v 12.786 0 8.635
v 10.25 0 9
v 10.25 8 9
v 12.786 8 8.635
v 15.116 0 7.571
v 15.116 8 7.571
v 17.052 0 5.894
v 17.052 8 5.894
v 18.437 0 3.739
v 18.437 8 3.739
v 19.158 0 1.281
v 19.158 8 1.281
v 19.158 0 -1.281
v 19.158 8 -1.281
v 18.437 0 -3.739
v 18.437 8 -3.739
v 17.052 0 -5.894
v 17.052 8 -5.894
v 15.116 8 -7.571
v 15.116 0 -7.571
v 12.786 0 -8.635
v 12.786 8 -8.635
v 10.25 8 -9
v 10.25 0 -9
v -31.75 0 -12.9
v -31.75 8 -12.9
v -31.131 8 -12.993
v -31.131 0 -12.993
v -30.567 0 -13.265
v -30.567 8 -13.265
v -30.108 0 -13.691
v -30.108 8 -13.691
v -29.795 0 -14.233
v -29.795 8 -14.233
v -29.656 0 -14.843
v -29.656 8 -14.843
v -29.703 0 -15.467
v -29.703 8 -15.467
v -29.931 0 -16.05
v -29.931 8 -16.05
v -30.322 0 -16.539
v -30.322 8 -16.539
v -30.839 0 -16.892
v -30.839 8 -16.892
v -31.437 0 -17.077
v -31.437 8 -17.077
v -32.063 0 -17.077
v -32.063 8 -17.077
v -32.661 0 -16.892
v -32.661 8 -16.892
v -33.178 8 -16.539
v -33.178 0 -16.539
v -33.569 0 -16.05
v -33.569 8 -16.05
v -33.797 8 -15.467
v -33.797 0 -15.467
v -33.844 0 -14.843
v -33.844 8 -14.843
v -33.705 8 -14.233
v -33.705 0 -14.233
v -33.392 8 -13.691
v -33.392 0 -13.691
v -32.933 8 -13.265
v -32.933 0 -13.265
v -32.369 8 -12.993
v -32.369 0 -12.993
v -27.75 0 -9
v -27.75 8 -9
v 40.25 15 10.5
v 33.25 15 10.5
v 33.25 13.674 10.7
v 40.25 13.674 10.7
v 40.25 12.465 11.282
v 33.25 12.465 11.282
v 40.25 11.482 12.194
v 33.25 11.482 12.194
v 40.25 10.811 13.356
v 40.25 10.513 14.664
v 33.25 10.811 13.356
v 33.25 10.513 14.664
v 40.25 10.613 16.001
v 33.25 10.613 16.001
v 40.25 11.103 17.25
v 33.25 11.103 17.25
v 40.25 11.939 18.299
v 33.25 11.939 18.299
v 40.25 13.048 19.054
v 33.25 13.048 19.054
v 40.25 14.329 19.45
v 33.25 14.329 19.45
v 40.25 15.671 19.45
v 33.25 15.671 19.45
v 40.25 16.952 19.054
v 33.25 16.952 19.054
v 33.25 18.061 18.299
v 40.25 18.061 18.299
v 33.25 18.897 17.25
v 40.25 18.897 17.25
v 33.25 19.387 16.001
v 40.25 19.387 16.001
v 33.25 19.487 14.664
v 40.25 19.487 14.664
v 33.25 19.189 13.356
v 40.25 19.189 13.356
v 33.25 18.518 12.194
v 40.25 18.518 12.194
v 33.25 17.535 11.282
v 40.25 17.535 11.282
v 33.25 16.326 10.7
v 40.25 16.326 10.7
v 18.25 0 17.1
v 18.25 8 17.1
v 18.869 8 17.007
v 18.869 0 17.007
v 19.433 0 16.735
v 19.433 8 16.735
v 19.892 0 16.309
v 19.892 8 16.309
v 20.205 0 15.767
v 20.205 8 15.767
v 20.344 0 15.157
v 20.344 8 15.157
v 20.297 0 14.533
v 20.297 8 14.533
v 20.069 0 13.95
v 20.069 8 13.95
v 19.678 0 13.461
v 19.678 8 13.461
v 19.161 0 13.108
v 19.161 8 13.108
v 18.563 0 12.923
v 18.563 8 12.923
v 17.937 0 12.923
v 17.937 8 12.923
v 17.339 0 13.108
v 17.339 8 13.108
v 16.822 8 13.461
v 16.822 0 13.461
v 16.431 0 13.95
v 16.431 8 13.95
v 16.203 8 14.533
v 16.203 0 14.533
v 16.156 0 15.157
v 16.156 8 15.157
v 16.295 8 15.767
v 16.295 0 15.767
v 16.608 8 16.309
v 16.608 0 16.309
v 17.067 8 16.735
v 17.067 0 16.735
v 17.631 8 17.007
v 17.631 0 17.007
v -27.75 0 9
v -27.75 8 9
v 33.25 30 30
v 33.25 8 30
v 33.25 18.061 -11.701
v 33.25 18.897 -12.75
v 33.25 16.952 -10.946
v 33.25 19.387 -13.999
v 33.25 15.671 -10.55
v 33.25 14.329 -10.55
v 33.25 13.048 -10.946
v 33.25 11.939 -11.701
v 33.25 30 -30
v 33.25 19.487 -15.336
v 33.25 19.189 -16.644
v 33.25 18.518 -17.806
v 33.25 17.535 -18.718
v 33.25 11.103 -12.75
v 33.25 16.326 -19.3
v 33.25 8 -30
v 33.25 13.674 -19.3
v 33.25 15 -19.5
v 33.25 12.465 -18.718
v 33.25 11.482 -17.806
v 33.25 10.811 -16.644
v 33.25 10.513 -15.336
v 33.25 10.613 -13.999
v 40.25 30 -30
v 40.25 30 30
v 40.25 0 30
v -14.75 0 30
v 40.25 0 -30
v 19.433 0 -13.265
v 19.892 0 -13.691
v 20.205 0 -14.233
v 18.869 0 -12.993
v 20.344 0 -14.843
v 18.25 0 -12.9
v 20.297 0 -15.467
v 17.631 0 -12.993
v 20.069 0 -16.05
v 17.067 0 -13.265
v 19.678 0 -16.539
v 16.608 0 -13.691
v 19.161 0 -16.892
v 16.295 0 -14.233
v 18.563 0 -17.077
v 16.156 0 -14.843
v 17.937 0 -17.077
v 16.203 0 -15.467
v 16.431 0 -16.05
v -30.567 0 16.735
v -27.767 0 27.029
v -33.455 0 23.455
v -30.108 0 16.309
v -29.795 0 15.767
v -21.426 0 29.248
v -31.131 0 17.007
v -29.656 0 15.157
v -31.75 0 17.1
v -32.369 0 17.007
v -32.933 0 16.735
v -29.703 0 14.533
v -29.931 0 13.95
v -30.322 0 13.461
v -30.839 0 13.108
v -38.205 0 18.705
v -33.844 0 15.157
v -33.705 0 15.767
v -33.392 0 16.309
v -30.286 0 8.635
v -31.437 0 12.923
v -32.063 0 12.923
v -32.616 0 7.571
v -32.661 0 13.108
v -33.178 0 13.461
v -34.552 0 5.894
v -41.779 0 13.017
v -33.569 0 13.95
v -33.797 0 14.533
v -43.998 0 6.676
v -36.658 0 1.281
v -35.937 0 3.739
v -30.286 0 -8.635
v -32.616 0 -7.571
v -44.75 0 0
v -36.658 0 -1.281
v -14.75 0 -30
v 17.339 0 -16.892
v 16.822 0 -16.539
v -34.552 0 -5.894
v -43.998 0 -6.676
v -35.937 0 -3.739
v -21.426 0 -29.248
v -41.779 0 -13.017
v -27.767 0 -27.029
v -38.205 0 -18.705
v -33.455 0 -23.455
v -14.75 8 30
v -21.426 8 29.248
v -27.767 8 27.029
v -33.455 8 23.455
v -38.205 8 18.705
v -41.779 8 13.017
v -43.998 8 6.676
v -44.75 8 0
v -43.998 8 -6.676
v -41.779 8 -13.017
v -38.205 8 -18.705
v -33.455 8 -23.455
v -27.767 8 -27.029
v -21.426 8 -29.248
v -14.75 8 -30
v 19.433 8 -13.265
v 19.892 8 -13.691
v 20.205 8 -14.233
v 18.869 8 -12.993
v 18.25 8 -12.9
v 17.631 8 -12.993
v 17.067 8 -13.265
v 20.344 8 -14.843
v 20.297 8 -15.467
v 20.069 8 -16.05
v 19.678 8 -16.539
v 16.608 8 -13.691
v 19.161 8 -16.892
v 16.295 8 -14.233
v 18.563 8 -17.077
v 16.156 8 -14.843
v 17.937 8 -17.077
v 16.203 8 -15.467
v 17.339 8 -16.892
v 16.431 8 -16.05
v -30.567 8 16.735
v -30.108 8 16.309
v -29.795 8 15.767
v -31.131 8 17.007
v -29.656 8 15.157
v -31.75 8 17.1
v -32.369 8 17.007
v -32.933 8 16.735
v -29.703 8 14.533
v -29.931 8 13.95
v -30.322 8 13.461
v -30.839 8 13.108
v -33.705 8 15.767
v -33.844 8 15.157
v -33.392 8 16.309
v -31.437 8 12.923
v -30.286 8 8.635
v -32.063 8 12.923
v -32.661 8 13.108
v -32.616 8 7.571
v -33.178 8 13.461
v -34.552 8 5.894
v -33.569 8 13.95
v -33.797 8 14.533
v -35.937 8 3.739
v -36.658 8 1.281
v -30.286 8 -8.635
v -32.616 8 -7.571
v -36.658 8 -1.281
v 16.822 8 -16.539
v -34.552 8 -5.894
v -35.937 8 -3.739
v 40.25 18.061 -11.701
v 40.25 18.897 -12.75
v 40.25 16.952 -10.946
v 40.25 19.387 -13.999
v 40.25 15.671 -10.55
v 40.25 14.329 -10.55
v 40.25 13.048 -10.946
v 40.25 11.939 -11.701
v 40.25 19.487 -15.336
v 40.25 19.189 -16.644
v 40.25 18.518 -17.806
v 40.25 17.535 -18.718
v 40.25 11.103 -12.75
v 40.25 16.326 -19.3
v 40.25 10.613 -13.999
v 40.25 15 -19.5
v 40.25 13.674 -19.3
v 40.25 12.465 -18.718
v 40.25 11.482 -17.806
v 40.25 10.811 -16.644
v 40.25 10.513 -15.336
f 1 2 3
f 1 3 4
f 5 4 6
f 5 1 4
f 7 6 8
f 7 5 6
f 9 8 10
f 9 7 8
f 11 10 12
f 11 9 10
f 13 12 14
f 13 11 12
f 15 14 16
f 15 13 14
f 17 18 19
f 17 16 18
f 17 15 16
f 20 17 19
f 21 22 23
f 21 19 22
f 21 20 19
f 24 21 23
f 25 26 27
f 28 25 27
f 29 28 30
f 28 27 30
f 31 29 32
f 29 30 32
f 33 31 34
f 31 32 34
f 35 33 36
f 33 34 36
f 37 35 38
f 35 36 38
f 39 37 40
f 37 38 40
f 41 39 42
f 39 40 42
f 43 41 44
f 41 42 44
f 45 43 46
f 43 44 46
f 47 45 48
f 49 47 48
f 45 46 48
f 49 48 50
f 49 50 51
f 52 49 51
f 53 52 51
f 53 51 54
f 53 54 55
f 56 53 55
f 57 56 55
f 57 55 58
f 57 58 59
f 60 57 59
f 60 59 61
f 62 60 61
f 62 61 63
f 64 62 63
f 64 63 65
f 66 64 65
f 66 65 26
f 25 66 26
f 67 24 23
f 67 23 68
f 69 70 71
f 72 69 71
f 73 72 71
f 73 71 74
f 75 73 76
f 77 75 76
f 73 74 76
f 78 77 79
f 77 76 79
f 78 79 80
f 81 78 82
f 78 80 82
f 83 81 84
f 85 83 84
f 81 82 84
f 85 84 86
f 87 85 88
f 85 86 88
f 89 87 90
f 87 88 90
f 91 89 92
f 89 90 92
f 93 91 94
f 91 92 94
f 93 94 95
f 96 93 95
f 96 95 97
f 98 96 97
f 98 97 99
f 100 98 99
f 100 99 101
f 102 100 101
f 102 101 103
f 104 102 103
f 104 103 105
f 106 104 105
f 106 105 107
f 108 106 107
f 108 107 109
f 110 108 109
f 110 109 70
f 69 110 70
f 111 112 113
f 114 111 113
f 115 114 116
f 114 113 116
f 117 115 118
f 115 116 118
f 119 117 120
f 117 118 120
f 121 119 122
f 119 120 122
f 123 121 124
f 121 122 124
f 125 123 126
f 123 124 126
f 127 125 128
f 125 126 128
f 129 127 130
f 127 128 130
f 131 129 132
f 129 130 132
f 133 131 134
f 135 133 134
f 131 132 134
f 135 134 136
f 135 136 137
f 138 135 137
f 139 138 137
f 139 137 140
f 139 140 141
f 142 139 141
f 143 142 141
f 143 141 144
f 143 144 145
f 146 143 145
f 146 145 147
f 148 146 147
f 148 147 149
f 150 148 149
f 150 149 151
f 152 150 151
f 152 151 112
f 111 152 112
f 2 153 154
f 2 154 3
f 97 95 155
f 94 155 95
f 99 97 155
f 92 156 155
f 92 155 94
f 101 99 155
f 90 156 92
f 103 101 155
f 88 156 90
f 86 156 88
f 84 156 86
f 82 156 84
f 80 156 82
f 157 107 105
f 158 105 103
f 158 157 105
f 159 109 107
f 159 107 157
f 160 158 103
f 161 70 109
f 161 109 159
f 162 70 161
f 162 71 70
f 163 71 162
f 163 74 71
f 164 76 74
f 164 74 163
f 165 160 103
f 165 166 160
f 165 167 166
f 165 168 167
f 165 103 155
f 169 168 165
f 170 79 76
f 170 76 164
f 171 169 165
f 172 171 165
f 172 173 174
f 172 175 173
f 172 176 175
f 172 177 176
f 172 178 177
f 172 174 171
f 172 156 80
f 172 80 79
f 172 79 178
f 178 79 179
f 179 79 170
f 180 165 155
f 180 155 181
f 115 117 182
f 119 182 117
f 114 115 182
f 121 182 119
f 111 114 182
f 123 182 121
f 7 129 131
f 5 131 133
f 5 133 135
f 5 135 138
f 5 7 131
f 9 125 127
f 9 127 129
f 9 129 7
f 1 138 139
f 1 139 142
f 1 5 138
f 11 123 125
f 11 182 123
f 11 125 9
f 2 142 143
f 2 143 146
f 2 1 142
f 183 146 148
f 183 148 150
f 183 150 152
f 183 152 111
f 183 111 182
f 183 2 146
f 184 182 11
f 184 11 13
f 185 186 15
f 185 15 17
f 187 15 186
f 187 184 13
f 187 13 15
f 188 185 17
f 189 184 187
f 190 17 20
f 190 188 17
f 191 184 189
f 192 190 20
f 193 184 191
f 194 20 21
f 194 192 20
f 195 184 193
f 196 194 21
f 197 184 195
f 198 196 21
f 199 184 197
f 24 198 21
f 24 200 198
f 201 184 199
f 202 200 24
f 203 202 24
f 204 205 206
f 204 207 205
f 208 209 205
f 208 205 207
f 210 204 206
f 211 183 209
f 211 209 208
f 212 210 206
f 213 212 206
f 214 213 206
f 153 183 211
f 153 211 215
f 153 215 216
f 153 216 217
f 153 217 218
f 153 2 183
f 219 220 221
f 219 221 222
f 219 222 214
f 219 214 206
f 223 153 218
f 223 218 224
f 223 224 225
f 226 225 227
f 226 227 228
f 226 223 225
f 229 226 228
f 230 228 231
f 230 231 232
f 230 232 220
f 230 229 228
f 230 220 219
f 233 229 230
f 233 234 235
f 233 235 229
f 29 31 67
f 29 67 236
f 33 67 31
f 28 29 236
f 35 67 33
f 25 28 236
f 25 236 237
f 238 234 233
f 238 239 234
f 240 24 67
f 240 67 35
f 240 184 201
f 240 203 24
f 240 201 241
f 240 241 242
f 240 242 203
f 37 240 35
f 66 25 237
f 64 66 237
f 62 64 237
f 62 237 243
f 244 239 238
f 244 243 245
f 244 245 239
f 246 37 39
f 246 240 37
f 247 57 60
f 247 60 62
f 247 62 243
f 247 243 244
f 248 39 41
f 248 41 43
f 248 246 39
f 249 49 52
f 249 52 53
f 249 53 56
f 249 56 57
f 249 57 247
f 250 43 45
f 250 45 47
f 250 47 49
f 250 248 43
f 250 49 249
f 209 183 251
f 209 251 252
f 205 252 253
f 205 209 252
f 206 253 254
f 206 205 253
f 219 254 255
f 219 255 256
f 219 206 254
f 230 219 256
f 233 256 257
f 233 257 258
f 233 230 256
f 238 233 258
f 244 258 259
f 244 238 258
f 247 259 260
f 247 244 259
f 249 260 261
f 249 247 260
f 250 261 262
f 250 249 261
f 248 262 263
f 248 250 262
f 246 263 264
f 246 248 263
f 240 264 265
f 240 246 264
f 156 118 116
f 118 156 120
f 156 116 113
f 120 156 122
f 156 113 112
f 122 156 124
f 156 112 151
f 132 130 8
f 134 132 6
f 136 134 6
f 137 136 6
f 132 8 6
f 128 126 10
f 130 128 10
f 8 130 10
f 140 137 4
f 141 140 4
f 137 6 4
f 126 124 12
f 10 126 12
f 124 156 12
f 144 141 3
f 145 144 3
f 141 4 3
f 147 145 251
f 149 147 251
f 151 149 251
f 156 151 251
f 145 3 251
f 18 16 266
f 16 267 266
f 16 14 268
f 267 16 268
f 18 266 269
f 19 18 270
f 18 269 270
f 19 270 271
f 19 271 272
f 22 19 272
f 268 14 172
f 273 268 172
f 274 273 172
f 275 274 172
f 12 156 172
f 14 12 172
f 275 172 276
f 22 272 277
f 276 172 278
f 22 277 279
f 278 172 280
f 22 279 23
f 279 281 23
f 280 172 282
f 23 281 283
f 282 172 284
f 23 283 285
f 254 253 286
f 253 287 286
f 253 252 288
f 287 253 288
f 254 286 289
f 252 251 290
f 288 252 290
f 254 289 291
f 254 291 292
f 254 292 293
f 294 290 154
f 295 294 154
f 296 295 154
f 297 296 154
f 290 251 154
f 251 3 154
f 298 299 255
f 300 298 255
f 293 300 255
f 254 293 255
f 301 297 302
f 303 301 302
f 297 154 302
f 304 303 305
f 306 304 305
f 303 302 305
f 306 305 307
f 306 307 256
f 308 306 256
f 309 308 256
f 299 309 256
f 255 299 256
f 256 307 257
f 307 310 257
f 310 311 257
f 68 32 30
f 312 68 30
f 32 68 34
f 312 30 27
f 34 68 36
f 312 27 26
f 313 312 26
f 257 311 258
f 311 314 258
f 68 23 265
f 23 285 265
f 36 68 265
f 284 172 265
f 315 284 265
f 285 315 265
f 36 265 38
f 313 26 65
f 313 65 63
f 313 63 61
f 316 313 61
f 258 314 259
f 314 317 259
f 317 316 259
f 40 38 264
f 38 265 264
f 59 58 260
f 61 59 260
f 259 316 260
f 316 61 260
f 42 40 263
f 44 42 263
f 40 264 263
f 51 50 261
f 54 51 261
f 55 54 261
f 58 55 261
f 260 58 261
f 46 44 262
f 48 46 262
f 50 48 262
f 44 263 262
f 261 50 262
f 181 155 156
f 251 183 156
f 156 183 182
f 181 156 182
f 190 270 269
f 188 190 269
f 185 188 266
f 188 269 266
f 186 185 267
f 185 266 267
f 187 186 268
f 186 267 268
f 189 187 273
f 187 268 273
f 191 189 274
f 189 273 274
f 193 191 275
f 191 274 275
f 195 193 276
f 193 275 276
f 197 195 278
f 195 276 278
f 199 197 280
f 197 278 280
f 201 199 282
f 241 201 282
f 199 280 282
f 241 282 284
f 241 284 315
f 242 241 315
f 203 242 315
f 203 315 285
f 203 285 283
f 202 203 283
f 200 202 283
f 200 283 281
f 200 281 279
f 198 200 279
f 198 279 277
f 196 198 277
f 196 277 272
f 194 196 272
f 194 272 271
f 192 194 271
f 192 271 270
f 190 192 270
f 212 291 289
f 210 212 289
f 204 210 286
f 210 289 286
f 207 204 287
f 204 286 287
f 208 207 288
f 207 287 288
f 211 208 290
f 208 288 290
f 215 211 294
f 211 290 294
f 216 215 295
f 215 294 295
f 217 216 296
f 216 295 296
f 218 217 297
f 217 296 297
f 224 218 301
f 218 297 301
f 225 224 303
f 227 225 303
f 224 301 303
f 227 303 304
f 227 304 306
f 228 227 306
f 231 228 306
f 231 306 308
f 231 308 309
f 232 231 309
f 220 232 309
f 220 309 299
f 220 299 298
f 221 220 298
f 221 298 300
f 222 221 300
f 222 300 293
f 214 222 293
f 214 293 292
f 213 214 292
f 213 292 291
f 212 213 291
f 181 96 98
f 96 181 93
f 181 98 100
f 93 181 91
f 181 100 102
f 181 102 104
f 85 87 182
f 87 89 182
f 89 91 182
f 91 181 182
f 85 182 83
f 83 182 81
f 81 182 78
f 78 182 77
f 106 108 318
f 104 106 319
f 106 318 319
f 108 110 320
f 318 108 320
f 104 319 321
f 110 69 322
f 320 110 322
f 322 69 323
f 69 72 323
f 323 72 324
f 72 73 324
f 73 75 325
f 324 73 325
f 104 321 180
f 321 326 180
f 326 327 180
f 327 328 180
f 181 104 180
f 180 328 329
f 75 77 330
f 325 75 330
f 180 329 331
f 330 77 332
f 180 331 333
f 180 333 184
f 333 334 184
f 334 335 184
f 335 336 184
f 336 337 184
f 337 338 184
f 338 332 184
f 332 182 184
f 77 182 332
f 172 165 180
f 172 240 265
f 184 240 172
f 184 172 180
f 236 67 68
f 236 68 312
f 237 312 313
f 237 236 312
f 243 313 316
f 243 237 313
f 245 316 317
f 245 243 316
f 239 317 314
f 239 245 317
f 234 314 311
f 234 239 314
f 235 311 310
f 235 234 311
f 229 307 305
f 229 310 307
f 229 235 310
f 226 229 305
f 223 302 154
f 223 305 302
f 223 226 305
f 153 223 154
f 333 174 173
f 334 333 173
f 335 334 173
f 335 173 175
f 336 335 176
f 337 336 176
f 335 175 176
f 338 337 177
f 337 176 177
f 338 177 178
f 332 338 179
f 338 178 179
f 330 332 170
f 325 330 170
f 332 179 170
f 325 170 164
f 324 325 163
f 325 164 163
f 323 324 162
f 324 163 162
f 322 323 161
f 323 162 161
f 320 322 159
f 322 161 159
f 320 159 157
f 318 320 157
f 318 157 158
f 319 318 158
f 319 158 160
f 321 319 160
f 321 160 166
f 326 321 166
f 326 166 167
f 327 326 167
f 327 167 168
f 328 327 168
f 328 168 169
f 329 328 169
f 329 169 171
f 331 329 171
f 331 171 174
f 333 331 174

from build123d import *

# Parameters (mm, degrees)
EXTRUDE_1_DEPTH     = 8
SKETCH_2_W          = 7
SKETCH_2_H          = 60
EXTRUDE_2_DEPTH     = 22
MM_1_D              = 9
CUT_EXTRUDE_1_DEPTH = 22
HOLE_WIZARD_M5_1_D  = 4.2


with BuildPart() as part:
    # 草图1 → 凸台-拉伸1 (new body)
    with BuildSketch(Plane(origin=(0, 0, 0), x_dir=(1, 0, 0), z_dir=(0, 1, 0))):
        with BuildLine():
            Line((-14.75, 30), (40.25, 30))
            Line((40.25, 30), (40.25, -30))
            Line((40.25, -30), (-14.75, -30))
            ThreePointArc((-14.75, -30), (-44.75, 0), (-14.75, 30))
        make_face()
    extrude(amount=EXTRUDE_1_DEPTH)

    # 草图2 → 凸台-拉伸2 (add)
    with BuildSketch(Plane(origin=(0, 8, 0), x_dir=(1, 0, 0), z_dir=(0, 1, 0))):
        with Locations((36.75, 0)):
            Rectangle(SKETCH_2_W, SKETCH_2_H)
    extrude(amount=EXTRUDE_2_DEPTH)

    # 大小mm 暗销孔1 (through all)
    with Locations(Plane(origin=(40.25, 15, 15), x_dir=(0, 0, 1), z_dir=(1, 0, 0))):
        with Locations((0, 0), (-30, 0)):
            Hole(MM_1_D / 2)

    # 草图5 → 切除-拉伸1 (cut)
    with BuildSketch(Plane.XZ):
        with BuildLine():
            Line((-27.75, 9), (10.25, 9))
            ThreePointArc((10.25, 9), (19.25, 0), (10.25, -9))
            Line((10.25, -9), (-27.75, -9))
            ThreePointArc((-27.75, -9), (-36.75, 0), (-27.75, 9))
        make_face()
    extrude(amount=-CUT_EXTRUDE_1_DEPTH, mode=Mode.SUBTRACT)

    # M5 螺纹孔1 (through all)
    with Locations(Plane(origin=(-31.75, 0, 15), x_dir=(0, 0, -1), z_dir=(0, -1, 0))):
        with Locations((0, 0), (0, 50), (30, 50), (30, 0)):
            Hole(HOLE_WIZARD_M5_1_D / 2)


solid = part.part
